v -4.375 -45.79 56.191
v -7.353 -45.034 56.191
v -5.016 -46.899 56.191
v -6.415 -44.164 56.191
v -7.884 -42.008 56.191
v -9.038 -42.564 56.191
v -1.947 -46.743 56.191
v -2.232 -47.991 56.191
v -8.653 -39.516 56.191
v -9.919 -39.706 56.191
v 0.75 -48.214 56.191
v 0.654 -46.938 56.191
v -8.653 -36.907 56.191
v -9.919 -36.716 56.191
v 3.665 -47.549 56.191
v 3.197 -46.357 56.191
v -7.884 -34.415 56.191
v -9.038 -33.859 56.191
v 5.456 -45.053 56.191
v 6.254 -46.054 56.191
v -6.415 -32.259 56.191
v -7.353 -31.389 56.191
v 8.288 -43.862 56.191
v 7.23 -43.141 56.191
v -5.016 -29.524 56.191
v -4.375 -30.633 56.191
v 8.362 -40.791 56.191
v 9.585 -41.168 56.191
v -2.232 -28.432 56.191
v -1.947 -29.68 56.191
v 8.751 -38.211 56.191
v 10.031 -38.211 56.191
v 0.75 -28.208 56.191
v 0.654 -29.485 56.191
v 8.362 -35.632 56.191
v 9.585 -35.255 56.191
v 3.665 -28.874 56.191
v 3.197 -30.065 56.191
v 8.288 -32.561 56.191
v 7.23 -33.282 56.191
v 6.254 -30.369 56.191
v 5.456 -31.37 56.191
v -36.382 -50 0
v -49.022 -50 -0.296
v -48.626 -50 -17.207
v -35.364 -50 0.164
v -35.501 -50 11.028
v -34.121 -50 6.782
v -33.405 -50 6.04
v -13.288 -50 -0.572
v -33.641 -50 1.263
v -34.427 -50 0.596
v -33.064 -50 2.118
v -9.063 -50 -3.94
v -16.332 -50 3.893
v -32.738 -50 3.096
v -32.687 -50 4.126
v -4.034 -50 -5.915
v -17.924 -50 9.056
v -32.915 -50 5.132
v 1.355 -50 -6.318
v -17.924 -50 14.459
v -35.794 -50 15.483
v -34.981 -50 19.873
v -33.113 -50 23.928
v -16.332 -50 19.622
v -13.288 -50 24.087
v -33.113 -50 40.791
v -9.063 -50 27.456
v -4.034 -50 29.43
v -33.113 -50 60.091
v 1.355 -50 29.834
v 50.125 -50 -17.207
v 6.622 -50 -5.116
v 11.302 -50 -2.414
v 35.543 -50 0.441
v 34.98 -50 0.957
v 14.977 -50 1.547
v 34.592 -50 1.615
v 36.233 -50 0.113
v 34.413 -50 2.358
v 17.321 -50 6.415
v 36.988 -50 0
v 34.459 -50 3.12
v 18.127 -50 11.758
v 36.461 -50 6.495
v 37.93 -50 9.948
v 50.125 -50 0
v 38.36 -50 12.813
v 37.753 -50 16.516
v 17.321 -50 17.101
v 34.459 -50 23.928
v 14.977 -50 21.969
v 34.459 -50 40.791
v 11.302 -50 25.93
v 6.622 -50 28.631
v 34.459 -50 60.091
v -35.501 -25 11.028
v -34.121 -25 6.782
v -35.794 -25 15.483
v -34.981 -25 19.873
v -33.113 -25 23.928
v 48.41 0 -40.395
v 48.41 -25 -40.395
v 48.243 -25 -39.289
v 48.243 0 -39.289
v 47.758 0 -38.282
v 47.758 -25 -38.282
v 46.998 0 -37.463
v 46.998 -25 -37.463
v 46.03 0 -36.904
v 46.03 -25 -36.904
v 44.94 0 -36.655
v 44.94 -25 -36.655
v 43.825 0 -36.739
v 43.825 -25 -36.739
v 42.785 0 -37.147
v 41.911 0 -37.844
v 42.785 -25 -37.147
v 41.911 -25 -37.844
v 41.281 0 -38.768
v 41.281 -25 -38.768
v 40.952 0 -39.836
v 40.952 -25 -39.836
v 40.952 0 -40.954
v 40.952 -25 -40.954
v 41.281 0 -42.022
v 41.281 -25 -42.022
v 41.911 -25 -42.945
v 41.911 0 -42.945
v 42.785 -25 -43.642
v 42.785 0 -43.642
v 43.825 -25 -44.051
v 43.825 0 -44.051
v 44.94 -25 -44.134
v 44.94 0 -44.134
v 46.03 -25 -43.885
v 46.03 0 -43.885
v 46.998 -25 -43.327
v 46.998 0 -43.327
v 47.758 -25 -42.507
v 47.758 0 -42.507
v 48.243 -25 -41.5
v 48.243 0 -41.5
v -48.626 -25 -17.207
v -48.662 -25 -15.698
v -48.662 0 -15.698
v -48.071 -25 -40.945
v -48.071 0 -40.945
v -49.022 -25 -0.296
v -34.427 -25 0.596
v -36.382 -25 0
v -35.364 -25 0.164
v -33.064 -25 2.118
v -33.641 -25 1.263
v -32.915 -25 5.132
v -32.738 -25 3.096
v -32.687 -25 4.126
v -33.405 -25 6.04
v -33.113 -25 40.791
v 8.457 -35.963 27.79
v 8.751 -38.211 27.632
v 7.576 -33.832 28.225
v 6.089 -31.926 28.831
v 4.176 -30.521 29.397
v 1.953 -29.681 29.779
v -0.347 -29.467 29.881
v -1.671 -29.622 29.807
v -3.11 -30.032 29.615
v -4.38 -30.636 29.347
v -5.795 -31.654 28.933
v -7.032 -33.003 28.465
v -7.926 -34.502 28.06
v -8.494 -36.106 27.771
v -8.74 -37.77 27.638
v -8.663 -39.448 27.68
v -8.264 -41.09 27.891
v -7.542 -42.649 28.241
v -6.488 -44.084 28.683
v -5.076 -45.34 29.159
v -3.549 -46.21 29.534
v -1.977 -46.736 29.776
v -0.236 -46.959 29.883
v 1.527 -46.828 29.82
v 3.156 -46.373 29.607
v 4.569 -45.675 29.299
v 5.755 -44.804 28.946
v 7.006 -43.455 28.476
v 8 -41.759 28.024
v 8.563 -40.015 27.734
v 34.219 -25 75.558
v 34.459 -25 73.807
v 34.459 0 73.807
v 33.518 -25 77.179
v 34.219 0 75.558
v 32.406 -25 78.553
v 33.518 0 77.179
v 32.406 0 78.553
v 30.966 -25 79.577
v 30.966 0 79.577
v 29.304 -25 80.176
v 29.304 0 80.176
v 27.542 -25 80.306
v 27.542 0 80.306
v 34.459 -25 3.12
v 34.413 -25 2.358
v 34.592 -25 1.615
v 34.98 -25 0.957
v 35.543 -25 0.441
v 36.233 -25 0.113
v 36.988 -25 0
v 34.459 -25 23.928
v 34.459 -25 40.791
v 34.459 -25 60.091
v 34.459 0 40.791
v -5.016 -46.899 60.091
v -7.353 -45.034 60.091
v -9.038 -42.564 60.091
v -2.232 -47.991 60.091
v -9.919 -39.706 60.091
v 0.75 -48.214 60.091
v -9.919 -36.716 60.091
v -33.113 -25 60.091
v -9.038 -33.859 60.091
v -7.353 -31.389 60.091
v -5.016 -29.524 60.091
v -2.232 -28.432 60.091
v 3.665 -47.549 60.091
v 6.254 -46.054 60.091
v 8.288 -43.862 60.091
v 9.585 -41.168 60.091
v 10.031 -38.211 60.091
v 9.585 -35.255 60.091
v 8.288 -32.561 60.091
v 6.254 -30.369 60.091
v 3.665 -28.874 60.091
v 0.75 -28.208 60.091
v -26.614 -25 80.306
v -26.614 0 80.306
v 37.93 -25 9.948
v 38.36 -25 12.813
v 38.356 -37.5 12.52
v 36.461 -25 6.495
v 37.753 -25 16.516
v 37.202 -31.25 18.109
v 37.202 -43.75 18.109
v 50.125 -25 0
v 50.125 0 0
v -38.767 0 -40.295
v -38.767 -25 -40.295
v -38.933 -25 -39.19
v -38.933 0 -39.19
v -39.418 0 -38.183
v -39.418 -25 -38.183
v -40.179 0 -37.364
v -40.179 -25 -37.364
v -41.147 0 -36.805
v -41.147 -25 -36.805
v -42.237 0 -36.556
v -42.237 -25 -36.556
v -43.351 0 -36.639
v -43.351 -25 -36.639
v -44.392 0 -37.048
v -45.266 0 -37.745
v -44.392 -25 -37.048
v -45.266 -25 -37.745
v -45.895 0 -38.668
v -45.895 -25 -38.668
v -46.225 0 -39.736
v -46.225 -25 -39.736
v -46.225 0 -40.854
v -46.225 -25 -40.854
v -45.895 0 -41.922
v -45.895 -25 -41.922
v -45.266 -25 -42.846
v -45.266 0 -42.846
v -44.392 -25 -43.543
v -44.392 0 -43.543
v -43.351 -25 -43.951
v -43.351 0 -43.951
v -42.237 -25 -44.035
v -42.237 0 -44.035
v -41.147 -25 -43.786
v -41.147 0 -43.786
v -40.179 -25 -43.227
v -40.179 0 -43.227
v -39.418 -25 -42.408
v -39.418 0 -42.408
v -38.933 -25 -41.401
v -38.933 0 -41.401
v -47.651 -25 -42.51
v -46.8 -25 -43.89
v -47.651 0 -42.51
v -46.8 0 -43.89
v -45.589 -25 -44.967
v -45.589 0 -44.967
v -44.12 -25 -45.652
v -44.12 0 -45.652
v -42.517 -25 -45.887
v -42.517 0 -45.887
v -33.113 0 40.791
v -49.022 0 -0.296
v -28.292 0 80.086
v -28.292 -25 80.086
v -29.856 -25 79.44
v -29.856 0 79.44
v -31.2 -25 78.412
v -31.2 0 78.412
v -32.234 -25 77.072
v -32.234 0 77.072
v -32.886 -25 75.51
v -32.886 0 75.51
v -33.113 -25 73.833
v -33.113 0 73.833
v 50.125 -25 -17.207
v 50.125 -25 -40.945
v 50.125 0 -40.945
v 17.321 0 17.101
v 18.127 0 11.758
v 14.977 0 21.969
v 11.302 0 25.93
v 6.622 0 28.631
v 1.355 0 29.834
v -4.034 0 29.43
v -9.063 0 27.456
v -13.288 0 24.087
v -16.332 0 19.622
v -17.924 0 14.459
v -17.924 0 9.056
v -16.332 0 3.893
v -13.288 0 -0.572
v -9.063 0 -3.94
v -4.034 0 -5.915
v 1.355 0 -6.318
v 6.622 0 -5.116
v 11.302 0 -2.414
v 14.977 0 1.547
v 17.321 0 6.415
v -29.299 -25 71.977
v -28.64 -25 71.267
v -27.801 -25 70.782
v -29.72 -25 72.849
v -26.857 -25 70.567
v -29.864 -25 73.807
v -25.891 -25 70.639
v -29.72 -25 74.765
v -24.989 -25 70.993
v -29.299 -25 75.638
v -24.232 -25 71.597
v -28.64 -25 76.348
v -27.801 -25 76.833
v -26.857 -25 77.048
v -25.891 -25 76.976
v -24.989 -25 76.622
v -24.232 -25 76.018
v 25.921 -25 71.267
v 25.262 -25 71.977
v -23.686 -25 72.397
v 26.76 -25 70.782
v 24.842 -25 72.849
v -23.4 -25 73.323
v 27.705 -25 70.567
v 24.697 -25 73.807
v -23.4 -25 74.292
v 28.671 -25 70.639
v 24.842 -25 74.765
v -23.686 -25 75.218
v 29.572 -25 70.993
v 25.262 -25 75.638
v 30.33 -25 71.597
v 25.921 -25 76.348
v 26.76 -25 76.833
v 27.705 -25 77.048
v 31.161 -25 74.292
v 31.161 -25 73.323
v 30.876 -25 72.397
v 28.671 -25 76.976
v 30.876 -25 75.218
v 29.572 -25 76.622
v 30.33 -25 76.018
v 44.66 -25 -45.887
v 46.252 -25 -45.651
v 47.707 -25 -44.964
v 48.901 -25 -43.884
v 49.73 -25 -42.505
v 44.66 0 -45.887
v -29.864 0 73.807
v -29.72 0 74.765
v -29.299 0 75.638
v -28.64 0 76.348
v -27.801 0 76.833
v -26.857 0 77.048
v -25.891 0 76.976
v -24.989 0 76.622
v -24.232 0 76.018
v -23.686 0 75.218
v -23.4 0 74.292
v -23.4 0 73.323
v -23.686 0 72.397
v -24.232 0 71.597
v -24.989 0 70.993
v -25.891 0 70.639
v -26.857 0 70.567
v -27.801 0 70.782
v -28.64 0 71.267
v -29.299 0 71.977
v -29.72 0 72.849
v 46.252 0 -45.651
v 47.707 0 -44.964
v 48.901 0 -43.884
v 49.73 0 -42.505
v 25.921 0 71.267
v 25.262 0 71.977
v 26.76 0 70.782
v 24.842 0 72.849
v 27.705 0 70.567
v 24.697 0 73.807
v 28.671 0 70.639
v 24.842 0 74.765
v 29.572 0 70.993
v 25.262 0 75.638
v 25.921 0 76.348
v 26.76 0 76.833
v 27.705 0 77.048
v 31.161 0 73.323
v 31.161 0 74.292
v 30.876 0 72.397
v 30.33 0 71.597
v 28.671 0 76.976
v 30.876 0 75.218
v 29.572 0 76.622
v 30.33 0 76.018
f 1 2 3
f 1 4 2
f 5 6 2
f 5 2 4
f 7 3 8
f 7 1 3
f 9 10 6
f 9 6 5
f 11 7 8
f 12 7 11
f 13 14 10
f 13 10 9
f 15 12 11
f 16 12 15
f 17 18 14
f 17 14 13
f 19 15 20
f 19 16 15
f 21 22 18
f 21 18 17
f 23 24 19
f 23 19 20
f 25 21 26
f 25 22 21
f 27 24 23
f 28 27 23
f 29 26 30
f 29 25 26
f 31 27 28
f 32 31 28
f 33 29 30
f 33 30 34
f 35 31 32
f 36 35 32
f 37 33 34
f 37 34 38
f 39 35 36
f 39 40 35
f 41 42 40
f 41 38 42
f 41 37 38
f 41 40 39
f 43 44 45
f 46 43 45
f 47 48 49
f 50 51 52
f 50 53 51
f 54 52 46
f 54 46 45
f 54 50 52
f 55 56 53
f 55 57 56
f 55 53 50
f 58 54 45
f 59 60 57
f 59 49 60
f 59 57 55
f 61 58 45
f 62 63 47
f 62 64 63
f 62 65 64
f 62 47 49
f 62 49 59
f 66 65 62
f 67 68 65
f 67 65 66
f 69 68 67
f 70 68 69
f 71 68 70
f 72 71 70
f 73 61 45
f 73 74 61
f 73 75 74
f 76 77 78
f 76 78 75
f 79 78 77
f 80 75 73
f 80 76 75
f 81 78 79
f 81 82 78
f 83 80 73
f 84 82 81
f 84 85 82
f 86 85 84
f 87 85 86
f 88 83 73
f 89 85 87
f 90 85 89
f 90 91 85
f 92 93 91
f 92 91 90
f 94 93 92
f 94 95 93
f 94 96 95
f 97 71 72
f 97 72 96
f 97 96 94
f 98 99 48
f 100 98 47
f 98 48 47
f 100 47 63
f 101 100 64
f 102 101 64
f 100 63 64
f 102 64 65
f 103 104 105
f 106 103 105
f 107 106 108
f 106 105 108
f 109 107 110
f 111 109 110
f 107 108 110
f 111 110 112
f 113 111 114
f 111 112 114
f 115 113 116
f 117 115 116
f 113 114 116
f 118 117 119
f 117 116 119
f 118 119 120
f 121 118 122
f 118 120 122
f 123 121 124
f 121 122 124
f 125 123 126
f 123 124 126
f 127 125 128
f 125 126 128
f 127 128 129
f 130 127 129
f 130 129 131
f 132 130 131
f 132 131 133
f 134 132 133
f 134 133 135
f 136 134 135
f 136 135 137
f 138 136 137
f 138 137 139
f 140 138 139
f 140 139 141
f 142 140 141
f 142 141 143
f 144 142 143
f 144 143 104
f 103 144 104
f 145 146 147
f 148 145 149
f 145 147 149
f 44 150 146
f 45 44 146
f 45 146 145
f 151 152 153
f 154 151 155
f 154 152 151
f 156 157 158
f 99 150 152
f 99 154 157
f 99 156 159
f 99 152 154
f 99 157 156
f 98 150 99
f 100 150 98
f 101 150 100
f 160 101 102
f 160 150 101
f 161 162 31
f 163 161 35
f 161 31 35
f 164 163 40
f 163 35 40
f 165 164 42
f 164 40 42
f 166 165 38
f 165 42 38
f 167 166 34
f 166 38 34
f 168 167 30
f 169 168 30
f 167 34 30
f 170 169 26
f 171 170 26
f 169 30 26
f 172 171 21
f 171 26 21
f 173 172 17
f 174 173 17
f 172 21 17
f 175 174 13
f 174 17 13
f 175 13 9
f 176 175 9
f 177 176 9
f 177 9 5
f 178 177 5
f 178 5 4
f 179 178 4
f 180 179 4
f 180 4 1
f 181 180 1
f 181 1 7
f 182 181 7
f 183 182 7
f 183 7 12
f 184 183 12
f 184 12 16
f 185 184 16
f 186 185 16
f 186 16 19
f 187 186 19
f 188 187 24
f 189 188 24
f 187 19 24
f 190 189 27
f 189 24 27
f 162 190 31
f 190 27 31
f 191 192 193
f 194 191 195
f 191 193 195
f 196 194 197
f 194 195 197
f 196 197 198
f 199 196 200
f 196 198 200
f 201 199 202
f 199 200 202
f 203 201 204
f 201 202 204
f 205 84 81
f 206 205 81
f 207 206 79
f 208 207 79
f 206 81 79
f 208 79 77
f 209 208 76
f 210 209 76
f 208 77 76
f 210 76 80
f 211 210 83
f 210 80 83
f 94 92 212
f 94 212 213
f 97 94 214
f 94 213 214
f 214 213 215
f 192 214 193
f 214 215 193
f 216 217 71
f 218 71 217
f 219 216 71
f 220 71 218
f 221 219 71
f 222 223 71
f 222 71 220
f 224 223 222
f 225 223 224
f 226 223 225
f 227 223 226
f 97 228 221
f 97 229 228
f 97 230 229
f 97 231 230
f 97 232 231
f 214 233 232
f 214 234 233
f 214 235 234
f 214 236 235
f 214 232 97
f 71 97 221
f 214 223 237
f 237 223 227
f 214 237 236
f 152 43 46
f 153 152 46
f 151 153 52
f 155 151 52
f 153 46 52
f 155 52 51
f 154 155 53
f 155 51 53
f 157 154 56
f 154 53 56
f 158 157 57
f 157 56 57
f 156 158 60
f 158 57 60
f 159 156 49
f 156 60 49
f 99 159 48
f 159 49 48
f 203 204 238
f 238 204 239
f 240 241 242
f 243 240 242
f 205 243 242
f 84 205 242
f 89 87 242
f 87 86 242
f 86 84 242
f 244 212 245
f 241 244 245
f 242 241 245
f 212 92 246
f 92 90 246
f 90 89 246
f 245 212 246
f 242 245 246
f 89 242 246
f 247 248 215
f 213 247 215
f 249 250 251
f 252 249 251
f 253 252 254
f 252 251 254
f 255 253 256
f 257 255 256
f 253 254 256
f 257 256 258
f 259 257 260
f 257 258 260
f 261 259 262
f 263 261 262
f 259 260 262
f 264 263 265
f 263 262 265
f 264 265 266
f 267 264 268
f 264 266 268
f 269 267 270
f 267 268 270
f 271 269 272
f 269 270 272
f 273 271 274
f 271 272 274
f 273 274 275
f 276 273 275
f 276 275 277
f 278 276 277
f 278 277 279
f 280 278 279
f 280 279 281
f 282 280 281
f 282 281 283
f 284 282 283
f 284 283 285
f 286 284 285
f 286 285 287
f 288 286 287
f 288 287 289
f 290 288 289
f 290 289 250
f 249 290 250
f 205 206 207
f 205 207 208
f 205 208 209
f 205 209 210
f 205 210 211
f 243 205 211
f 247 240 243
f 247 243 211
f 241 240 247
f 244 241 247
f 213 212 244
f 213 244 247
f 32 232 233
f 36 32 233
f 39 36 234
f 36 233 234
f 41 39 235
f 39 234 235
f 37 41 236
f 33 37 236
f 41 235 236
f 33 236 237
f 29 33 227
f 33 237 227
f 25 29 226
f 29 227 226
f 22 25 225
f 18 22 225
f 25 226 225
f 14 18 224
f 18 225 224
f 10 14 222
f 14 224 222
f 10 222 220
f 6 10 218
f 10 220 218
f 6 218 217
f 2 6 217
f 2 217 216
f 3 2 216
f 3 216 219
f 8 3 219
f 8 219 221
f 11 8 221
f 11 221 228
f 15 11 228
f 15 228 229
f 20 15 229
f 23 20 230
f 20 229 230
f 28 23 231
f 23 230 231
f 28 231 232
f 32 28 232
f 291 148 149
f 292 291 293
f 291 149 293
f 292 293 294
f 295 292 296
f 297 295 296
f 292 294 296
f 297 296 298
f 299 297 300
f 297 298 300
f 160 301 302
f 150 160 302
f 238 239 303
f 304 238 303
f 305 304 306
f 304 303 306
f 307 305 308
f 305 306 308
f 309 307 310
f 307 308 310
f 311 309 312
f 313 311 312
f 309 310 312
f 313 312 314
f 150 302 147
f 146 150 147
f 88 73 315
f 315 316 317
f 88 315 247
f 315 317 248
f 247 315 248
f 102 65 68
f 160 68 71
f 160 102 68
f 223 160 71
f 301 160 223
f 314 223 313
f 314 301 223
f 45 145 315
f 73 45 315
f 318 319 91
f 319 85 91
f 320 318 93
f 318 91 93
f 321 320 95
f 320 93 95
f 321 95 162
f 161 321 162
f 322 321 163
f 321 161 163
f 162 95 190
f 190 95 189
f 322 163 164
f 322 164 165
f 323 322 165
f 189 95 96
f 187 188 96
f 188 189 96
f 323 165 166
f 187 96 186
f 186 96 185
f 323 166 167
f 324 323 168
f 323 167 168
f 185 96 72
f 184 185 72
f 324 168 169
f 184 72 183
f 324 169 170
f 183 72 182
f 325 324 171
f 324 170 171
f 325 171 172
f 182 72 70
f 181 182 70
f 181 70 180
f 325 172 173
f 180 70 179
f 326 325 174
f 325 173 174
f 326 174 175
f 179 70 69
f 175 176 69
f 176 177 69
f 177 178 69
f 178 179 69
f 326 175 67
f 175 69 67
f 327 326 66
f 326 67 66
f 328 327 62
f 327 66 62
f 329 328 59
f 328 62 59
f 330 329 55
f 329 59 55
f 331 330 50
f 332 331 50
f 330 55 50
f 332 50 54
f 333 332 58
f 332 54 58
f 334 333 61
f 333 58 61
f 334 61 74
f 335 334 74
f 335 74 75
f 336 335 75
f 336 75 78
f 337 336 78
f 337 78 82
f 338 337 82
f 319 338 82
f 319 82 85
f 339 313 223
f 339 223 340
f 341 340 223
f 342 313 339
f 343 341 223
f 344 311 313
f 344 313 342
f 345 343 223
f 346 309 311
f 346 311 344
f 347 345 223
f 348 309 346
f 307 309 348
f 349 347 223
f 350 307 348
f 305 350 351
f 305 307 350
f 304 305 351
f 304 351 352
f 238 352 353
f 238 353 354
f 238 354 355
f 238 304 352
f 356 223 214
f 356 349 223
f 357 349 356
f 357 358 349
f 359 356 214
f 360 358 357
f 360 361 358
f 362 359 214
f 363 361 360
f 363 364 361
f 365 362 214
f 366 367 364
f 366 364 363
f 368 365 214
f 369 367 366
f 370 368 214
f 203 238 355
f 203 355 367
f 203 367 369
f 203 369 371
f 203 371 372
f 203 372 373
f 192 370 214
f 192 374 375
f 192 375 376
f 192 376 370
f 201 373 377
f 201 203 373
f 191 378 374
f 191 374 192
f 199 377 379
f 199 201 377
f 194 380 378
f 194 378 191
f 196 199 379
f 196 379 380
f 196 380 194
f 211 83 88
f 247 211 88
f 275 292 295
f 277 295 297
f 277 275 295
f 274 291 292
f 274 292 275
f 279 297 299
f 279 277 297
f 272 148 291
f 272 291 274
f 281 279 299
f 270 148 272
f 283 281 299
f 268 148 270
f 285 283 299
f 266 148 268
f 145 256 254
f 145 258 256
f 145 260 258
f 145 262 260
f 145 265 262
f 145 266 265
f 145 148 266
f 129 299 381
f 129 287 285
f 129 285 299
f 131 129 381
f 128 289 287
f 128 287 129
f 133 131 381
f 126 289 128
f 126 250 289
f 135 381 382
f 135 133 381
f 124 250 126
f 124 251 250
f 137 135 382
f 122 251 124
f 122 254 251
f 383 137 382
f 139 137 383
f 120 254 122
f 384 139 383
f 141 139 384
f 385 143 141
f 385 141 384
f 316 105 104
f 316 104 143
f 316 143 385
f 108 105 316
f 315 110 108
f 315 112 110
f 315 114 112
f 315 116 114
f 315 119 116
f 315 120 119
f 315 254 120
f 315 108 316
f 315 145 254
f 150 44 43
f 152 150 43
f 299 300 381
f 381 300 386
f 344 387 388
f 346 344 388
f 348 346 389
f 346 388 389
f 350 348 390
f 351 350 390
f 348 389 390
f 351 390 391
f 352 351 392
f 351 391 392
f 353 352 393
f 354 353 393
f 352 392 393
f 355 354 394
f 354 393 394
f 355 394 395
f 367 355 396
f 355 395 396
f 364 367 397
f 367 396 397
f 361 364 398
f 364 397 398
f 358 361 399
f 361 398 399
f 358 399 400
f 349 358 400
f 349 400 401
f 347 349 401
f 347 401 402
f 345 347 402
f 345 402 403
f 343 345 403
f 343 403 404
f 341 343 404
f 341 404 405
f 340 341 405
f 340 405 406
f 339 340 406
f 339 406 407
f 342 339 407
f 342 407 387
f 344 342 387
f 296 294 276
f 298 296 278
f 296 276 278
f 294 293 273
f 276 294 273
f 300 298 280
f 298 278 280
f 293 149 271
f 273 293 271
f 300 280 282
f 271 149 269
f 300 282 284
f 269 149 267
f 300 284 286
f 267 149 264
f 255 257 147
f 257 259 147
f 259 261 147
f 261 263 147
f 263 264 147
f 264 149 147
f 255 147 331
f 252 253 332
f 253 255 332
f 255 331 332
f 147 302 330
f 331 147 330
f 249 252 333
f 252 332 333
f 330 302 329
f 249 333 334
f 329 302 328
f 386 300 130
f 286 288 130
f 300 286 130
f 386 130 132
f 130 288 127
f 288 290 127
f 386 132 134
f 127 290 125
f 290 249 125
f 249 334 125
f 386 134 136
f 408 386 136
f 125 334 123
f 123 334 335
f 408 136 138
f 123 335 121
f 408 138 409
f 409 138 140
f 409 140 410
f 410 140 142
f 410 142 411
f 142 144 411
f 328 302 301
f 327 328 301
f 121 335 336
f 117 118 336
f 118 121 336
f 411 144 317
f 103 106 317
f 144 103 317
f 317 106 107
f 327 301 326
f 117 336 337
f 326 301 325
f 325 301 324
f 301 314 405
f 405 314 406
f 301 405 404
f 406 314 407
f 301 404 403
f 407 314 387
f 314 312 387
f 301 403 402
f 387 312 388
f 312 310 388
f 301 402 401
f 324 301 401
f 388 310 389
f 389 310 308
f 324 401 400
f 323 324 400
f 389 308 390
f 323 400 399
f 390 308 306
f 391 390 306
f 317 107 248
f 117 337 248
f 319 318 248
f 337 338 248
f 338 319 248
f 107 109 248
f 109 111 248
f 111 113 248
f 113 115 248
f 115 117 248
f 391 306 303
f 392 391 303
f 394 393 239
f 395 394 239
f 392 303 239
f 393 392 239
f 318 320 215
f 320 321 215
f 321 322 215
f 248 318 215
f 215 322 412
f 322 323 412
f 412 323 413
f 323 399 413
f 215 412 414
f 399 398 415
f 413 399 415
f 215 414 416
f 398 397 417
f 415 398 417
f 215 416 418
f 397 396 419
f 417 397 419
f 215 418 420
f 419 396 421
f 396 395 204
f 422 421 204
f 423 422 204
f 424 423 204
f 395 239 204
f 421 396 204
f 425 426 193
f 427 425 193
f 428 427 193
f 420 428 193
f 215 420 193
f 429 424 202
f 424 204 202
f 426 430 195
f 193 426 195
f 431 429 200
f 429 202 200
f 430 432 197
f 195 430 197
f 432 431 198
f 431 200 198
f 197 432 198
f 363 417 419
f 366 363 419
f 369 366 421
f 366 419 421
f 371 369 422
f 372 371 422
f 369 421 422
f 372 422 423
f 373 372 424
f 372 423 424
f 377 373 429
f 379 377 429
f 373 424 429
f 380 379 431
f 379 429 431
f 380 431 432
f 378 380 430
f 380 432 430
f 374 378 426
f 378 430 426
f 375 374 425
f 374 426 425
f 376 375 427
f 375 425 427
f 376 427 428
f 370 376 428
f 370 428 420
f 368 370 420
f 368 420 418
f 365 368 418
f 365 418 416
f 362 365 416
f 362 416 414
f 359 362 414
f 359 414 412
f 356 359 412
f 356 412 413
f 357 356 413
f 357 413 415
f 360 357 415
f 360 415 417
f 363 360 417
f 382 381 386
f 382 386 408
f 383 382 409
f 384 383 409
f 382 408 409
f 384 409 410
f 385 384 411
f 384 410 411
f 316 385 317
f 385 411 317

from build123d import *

# Parameters (mm, degrees)
F0_R      = 17.0227145172
F0_R_2    = 3.25
F1_DEPTH  = 25
F2_R      = 3.25
F3_DEPTH  = 70
F4_DEPTH  = 70
F5_R      = 18.1266213474
F6_DEPTH  = 25
F7_DEPTH  = 70
F9_DEPTH  = 25
F5_W      = 67.5716735423
F5_H      = 19.3005736992
F10_DEPTH = 25
F11_R     = 10.0310705793
F12_DEPTH = 3.9
F13_R     = 8.7509220972
F14_DEPTH = 45.3
F15_R     = 3.75
F16_DEPTH = 70
F17_DEPTH = 70


with BuildPart() as f1:
    # F0 (on Front) → F1 (new body)
    with BuildSketch(Plane.XZ):
        with BuildLine():
            Line((34.4588756561, 55.8330058903), (-33.1127978861, 55.8330058903))
            Line((-33.1127978861, 55.8330058903), (-33.1127978861, 40.7908696607))
            Line((-33.1127978861, 40.7908696607), (-33.1127978861, 25.7487334311))
            add(Edge.make_bspline(
                [(-33.1127978861, 25.7487334311), (-34.6033996611, 22.4340609922), (-37.650110278, 15.6590471152), (-34.6467602747, 8.3554726364), (-33.1127978861, 4.625168629)],
                knots=[0, 0, 0, 0, 0.4892495424, 1, 1, 1, 1], degree=3))
            add(Edge.make_bspline(
                [(-33.1127978861, 4.625168629), (-32.7607149389, 2.6646672617), (-32.1126225155, -0.9441018995), (-35.0434349429, -0.2960094761), (-36.3820530474, 0)],
                knots=[0, 0, 0, 0, 0.543260397, 1, 1, 1, 1], degree=3))
            Line((-36.3820530474, 0), (-49.0224920213, -0.2960094761))
            Line((-49.0224920213, -0.2960094761), (-48.661808527, -15.6982113192))
            Line((-48.661808527, -15.6982113192), (50.1245036721, -15.6982113192))
            Line((50.1245036721, -15.6982113192), (50.1245036721, 0))
            Line((50.1245036721, 0), (37.6335456967, 0))
            add(Edge.make_bspline(
                [(34.4588756561, 4.625168629), (34.1095986146, 2.6618613561), (33.4709502093, -0.928019769), (36.3355820401, -0.2893713637), (37.6335456967, 0)],
                knots=[0, 0, 0, 0, 0.5469003581, 1, 1, 1, 1], degree=3))
            add(Edge.make_bspline(
                [(34.4588756561, 25.7487334311), (36.1774809535, 21.1049777281), (39.2730683507, 12.7405489371), (35.9410342162, 7.1236727718), (34.4588756561, 4.625168629)],
                knots=[0, 0, 0, 0, 0.5551790587, 1, 1, 1, 1], degree=3))
            Line((34.4588756561, 25.7487334311), (34.4588756561, 40.7908696607))
            Line((34.4588756561, 40.7908696607), (34.4588756561, 55.8330058903))
        make_face()
        with Locations((0, 12.6643273979)):
            Circle(F0_R, mode=Mode.SUBTRACT)
        with BuildLine():
            Line((50.1245036721, -15.6982113192), (-48.661808527, -15.6982113192))
            Line((-48.661808527, -15.6982113192), (-48.0705925932, -40.9447981115))
            ThreePointArc((-48.0705925932, -40.9447981115), (-46.2339945035, -44.4725848586), (-42.5167828798, -45.8870492876))
            Line((-42.5167828798, -45.8870492876), (44.6597114205, -45.8870492876))
            ThreePointArc((44.6597114205, -45.8870492876), (48.3437920738, -44.4682292272), (50.1245036721, -40.9447981115))
            Line((50.1245036721, -40.9447981115), (50.1245036721, -15.6982113192))
        make_face()
        with Locations((-42.5167828798, -40.2954021766)):
            Circle(F0_R_2, mode=Mode.SUBTRACT)
        with Locations((44.6597114205, -40.3946330681)):
            Circle(F0_R_2, mode=Mode.SUBTRACT)
        with BuildLine():
            ThreePointArc((-26.6140252352, 80.306276679), (-31.2003440388, 78.4118406934), (-33.1127978861, 73.8330058903))
            Line((-33.1127978861, 73.8330058903), (-33.1127978861, 55.8330058903))
            Line((-33.1127978861, 55.8330058903), (34.4588756561, 55.8330058903))
            Line((34.4588756561, 55.8330058903), (34.4588756561, 73.807453795))
            ThreePointArc((34.4588756561, 73.807453795), (32.4062242428, 78.5527695695), (27.542417869, 80.306276679))
            Line((27.542417869, 80.306276679), (-26.6140252352, 80.306276679))
        make_face()
        with Locations((-26.6140252352, 73.807453795)):
            Circle(F0_R_2, mode=Mode.SUBTRACT)
        with Locations((27.9474437952, 73.807453795)):
            Circle(F0_R_2, mode=Mode.SUBTRACT)
        with Locations((0, 12.6643273979)):
            Circle(F0_R)
        with BuildLine():
            Line((-33.1127978861, 25.7487334311), (-33.1127978861, 40.7908696607))
            Line((-33.1127978861, 40.7908696607), (-49.0224920213, -0.2960094761))
            Line((-49.0224920213, -0.2960094761), (-36.3820530474, 0))
            add(Edge.make_bspline(
                [(-33.1127978861, 4.625168629), (-32.7607149389, 2.6646672617), (-32.1126225155, -0.9441018995), (-35.0434349429, -0.2960094761), (-36.3820530474, 0)],
                knots=[0, 0, 0, 0, 0.543260397, 1, 1, 1, 1], degree=3))
            add(Edge.make_bspline(
                [(-33.1127978861, 25.7487334311), (-34.6033996611, 22.4340609922), (-37.650110278, 15.6590471152), (-34.6467602747, 8.3554726364), (-33.1127978861, 4.625168629)],
                knots=[0, 0, 0, 0, 0.4892495424, 1, 1, 1, 1], degree=3))
        make_face()
        with BuildLine():
            Line((50.1245036721, 0), (34.4588756561, 40.7908696607))
            Line((34.4588756561, 40.7908696607), (34.4588756561, 25.7487334311))
            add(Edge.make_bspline(
                [(34.4588756561, 25.7487334311), (36.1774809535, 21.1049777281), (39.2730683507, 12.7405489371), (35.9410342162, 7.1236727718), (34.4588756561, 4.625168629)],
                knots=[0, 0, 0, 0, 0.5551790587, 1, 1, 1, 1], degree=3))
            add(Edge.make_bspline(
                [(34.4588756561, 4.625168629), (34.1095986146, 2.6618613561), (33.4709502093, -0.928019769), (36.3355820401, -0.2893713637), (37.6335456967, 0)],
                knots=[0, 0, 0, 0, 0.5469003581, 1, 1, 1, 1], degree=3))
            Line((37.6335456967, 0), (50.1245036721, 0))
        make_face()
        with Locations((-26.6140252352, 73.807453795)):
            Circle(F0_R_2)
        with Locations((27.9474437952, 73.807453795)):
            Circle(F0_R_2)
        with Locations((-42.5167828798, -40.2954021766)):
            Circle(F0_R_2)
        with Locations((44.6597114205, -40.3946330681)):
            Circle(F0_R_2)
    extrude(amount=F1_DEPTH)

    # F2 (on face) → F3 (cut)
    with BuildSketch(Plane(origin=(0, 0, 0), x_dir=(-1, 0, 0), z_dir=(0, 1, 0))):
        with Locations((-27.9474437952, 73.807453795)):
            Circle(F2_R)
    extrude(amount=-F3_DEPTH, mode=Mode.SUBTRACT)

    # F2 (on face) → F4 (cut)
    with BuildSketch(Plane(origin=(0, 0, 0), x_dir=(-1, 0, 0), z_dir=(0, 1, 0))):
        with Locations((26.6140252352, 73.807453795)):
            Circle(F2_R)
    extrude(amount=-F4_DEPTH, mode=Mode.SUBTRACT)

    # F5 (on face) → F6 (join)
    with BuildSketch(Plane.XZ.offset(25)):
        with BuildLine():
            Line((34.4588756561, 20.5979254097), (34.4588756561, 40.7908696607))
            Line((34.4588756561, 40.7908696607), (-33.1127978861, 40.7908696607))
            Line((-33.1127978861, 40.7908696607), (-33.1127978861, 20.5979254097))
            ThreePointArc((-33.1127978861, 20.5979254097), (-37.1626297585, 12.9749266175), (-34.7937931273, 4.6743325547))
            ThreePointArc((-34.7937931273, 4.6743325547), (-33.9547139722, 1.7822291717), (-36.3820530474, 0))
            Line((-36.3820530474, 0), (-49.0224920213, -0.2960094761))
            Line((-49.0224920213, -0.2960094761), (-48.626471606, -17.2071974467))
            Line((-48.626471606, -17.2071974467), (50.1245036721, -17.2071974467))
            Line((50.1245036721, -17.2071974467), (50.1245036721, 0))
            Line((50.1245036721, 0), (37.3762585223, 0))
            ThreePointArc((37.3762585223, 0), (34.6582437375, 2.1242313939), (36.0628159286, 5.2749678705))
            ThreePointArc((36.0628159286, 5.2749678705), (37.5665970474, 13.1778026111), (34.4588756561, 20.5979254097))
        make_face()
        with Locations((0, 11.75764855)):
            Circle(F5_R, mode=Mode.SUBTRACT)
        with BuildLine():
            Line((-33.1127978861, 20.5979254097), (-33.1127978861, 40.7908696607))
            Line((-33.1127978861, 40.7908696607), (-49.0224920213, -0.2960094761))
            Line((-49.0224920213, -0.2960094761), (-36.3820530474, 0))
            ThreePointArc((-36.3820530474, 0), (-33.9547139722, 1.7822291717), (-34.7937931273, 4.6743325547))
            ThreePointArc((-34.7937931273, 4.6743325547), (-37.1626297585, 12.9749266175), (-33.1127978861, 20.5979254097))
        make_face()
        with BuildLine():
            Line((50.1245036721, 0), (34.4588756561, 40.7908696607))
            Line((34.4588756561, 40.7908696607), (34.4588756561, 20.5979254097))
            ThreePointArc((34.4588756561, 20.5979254097), (37.5665970474, 13.1778026111), (36.0628159286, 5.2749678705))
            ThreePointArc((36.0628159286, 5.2749678705), (34.6582437375, 2.1242313939), (37.3762585223, 0))
            Line((37.3762585223, 0), (50.1245036721, 0))
        make_face()
    extrude(amount=F6_DEPTH)

    # F7 (cut): a face of the model
    f7_faces = [f1.faces().sort_by_distance(p)[0] for p in [
        (0, -25, 11.75764855),
    ]]
    extrude(f7_faces, amount=-F7_DEPTH, mode=Mode.SUBTRACT)

    # F8 (on face) → F9 (cut)
    with BuildSketch(Plane.XZ.offset(50)):
        with BuildLine():
            Line((-33.1127978861, 23.9283517003), (-33.1127978861, 40.7908696607))
            Line((-33.1127978861, 40.7908696607), (-49.0224920213, -0.2960094761))
            Line((-49.0224920213, -0.2960094761), (-36.3820530474, 0))
            ThreePointArc((-36.3820530474, 0), (-32.8674732325, 2.5960168229), (-34.120904149, 6.7817647319))
            ThreePointArc((-34.120904149, 6.7817647319), (-35.7939711067, 15.4830585232), (-33.1127978861, 23.9283517003))
        make_face()
        with BuildLine():
            Line((50.1245036721, 0), (34.4588756561, 40.7908696607))
            Line((34.4588756561, 40.7908696607), (34.4588756561, 23.9283517003))
            add(Edge.make_bspline(
                [(34.4588756561, 23.9283517003), (36.4646656644, 20.023537046), (40.3133082853, 12.5311096019), (36.3544858645, 6.1672411956), (34.4588756561, 3.1200184021)],
                knots=[0, 0, 0, 0, 0.5211681639, 1, 1, 1, 1], degree=3))
            ThreePointArc((34.4588756561, 3.1200184021), (34.9800199126, 0.9572074446), (36.9882769883, 0))
            Line((36.9882769883, 0), (50.1245036721, 0))
        make_face()
    extrude(amount=-F9_DEPTH, mode=Mode.SUBTRACT)

    # F5 (on face) → F10 (join)
    with BuildSketch(Plane.XZ.offset(25)):
        with Locations((0.673038885, 50.4411565103)):
            Rectangle(F5_W, F5_H)
    extrude(amount=F10_DEPTH)

    # F11 (on face) → F12 (cut)
    with BuildSketch(Plane.XY.offset(60.0914433599)):
        with Locations((0, -38.2113941014)):
            Circle(F11_R)
    extrude(amount=-F12_DEPTH, mode=Mode.SUBTRACT)

    # F13 (on face) → F14 (cut)
    with BuildSketch(Plane.XY.offset(56.1914433599)):
        with Locations((0, -38.2113941014)):
            Circle(F13_R)
    extrude(amount=-F14_DEPTH, mode=Mode.SUBTRACT)

    # F15 (on face) → F16 (cut)
    with BuildSketch(Plane.XZ.offset(25)):
        with Locations((-42.5167828798, -40.2954021766)):
            Circle(F15_R)
    extrude(amount=-F16_DEPTH, mode=Mode.SUBTRACT)

    # F15 (on face) → F17 (cut)
    with BuildSketch(Plane.XZ.offset(25)):
        with Locations((44.6597114205, -40.3946330681)):
            Circle(F15_R)
    extrude(amount=-F17_DEPTH, mode=Mode.SUBTRACT)


solid = f1.part
